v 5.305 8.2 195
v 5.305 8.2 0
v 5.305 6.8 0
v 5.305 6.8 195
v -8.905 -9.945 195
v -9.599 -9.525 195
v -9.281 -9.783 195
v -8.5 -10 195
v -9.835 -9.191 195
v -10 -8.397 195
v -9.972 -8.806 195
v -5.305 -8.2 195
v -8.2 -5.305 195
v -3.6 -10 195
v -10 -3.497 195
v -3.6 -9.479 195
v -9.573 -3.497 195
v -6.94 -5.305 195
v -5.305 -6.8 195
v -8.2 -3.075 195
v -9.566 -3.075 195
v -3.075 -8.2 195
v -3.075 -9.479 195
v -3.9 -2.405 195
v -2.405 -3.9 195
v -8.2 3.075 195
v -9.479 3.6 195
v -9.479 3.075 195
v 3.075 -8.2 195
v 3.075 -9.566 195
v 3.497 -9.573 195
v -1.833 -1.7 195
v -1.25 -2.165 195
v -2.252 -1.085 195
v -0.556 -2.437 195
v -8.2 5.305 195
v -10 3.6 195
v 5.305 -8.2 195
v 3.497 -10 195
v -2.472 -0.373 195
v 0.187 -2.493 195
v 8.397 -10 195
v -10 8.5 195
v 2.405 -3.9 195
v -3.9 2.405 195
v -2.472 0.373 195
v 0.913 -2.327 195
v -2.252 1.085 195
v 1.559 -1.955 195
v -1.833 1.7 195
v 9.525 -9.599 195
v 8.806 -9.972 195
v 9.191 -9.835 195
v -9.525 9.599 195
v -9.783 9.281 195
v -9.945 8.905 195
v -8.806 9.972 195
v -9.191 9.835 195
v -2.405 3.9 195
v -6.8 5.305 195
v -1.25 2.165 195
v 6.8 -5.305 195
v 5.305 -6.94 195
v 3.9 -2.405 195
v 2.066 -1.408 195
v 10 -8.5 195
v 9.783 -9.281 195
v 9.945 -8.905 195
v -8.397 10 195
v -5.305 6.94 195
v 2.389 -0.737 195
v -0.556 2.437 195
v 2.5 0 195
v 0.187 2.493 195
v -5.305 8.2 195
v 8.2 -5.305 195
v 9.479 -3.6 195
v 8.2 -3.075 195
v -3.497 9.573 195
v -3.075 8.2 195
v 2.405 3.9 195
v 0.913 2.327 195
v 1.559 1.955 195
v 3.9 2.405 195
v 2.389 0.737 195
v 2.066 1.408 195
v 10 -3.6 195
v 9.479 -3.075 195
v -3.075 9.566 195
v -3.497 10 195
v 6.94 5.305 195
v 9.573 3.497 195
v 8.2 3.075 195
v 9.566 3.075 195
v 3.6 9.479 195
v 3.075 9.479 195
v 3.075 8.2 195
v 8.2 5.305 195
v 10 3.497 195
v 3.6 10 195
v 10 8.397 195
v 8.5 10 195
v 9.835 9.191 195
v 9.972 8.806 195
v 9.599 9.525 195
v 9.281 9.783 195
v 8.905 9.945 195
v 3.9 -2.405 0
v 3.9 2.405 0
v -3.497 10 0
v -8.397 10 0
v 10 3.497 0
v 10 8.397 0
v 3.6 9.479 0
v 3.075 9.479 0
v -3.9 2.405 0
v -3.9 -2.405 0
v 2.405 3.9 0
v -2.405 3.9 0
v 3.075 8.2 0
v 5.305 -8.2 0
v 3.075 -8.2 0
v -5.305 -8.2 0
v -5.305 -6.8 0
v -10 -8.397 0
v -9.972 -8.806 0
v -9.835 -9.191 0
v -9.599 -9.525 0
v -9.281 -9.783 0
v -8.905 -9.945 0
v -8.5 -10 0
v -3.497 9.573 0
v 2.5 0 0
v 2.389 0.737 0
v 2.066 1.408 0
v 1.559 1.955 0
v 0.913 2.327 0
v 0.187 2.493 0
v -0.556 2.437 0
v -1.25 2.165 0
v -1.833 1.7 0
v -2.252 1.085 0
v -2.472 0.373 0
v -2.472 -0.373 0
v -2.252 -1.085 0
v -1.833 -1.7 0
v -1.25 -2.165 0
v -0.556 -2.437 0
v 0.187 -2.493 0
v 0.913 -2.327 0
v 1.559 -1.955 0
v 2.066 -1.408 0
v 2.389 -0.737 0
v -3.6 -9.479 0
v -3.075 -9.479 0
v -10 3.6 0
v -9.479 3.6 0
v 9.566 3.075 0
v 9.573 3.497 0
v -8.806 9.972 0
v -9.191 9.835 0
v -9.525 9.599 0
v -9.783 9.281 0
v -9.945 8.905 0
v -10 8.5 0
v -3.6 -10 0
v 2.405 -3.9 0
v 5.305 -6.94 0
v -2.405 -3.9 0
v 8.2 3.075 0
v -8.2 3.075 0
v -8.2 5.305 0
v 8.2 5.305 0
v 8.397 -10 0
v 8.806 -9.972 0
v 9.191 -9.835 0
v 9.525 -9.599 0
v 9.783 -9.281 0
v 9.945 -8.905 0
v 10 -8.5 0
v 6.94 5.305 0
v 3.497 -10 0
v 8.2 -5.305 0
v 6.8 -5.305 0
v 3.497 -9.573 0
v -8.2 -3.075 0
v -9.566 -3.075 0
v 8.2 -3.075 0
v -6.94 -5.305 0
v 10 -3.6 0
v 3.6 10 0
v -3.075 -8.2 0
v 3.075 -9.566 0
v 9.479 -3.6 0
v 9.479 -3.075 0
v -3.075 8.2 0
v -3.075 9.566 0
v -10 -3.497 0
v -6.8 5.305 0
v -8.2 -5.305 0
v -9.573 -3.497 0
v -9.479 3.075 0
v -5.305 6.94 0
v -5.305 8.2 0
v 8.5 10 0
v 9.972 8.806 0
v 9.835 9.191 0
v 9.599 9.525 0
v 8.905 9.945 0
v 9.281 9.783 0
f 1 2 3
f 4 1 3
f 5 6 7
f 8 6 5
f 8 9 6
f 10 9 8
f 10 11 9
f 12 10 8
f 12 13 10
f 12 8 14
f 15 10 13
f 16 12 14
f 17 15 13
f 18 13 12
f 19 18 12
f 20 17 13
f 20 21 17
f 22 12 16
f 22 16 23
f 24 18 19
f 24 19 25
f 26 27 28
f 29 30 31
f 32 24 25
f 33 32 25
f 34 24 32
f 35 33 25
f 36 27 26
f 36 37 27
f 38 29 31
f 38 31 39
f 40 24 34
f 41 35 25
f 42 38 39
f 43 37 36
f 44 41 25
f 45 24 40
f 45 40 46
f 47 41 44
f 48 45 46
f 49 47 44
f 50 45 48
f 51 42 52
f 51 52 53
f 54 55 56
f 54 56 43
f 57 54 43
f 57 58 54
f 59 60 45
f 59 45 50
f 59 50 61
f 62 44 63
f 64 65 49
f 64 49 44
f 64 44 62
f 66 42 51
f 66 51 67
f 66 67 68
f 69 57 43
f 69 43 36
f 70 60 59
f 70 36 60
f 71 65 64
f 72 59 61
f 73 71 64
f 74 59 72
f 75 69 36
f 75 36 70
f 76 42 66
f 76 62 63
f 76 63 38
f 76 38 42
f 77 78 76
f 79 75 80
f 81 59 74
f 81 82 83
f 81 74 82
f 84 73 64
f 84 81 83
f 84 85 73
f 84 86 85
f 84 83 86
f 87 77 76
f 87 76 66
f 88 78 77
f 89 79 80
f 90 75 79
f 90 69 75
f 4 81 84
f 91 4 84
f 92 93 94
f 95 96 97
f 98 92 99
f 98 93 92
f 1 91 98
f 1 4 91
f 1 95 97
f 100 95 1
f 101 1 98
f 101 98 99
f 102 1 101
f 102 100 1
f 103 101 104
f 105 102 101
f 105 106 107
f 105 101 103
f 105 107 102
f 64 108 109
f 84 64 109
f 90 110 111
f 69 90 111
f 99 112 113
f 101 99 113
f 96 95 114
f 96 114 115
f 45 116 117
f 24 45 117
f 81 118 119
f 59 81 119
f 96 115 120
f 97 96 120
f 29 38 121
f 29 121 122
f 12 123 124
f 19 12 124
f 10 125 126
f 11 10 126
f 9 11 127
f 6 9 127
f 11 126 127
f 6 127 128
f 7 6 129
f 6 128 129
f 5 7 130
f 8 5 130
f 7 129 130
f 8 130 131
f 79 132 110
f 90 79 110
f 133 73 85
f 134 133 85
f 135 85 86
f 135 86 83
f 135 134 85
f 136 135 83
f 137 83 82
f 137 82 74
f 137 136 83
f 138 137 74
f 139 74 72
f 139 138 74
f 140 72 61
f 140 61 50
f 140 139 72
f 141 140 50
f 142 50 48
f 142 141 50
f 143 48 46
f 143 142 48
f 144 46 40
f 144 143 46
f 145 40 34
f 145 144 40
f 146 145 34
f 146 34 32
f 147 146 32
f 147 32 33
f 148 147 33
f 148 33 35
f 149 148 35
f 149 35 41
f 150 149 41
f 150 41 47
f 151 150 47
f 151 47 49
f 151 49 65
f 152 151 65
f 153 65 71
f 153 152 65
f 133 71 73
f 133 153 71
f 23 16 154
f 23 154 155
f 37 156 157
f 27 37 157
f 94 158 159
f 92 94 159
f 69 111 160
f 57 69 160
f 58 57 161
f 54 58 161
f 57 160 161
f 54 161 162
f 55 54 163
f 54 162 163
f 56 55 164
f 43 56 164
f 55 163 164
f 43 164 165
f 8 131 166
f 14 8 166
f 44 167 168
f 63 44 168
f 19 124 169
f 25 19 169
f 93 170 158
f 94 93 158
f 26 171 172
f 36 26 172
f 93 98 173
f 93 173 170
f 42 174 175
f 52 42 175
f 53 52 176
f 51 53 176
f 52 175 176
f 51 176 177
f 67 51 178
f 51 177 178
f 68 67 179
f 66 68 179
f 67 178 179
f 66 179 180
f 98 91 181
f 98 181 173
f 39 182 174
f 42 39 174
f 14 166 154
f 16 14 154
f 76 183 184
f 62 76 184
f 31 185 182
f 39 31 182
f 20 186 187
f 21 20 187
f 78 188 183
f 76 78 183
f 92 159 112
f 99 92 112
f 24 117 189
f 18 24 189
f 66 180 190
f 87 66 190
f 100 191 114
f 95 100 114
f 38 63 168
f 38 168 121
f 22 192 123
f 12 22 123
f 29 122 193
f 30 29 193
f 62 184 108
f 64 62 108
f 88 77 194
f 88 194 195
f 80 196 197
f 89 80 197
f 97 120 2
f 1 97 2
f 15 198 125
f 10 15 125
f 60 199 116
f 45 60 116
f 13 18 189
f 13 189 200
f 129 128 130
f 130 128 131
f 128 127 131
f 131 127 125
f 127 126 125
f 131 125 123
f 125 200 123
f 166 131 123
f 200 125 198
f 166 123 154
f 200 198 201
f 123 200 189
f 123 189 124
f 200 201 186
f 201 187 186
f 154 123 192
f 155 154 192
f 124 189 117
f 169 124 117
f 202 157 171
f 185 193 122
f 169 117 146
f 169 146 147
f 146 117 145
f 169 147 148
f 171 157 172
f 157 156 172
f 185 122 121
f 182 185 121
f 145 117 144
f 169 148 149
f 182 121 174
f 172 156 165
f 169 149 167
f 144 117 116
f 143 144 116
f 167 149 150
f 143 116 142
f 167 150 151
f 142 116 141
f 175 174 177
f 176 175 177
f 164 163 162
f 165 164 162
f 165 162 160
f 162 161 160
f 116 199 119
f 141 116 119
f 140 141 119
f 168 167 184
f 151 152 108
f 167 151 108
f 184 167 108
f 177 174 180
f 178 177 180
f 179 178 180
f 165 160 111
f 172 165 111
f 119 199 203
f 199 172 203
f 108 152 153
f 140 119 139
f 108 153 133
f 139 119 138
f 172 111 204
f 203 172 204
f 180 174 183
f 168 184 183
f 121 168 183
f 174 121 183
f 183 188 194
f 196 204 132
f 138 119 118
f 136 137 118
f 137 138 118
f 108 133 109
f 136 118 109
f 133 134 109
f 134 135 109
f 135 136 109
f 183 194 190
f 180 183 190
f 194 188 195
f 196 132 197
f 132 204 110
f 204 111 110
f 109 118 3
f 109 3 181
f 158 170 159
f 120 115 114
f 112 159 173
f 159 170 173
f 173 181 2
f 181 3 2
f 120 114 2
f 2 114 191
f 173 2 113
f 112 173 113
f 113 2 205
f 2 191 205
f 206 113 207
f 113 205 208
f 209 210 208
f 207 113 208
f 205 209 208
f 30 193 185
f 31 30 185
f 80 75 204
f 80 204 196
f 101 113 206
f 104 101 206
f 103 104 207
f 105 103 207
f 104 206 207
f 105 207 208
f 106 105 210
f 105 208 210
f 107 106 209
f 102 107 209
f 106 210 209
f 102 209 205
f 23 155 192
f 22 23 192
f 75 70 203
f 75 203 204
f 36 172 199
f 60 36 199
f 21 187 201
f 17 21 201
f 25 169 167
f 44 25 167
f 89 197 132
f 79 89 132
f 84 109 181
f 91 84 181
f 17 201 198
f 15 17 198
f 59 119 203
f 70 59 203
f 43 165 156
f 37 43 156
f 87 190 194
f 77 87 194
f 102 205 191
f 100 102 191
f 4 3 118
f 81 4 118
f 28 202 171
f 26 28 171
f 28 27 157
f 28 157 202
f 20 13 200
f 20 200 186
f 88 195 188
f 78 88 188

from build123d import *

# Parameters (mm, degrees)
SKETCH1_R           = 2.5
BOSS_EXTRUDE1_DEPTH = 195


with BuildPart() as part:
    # Sketch1 → Boss-Extrude1 (new body)
    with BuildSketch(Plane.XY):
        with BuildLine():
            Line((9.573137603, 3.497470387), (10, 3.497470387))
            Line((10, 3.497470387), (10, 8.397470387))
            ThreePointArc((10, 8.397470387), (9.598622578, 9.525052949), (8.5, 10))
            Line((8.5, 10), (3.6, 10))
            Line((3.6, 10), (3.6, 9.479132912))
            Line((3.6, 9.479132912), (3.075, 9.479132912))
            Line((3.075, 9.479132912), (3.075, 8.2))
            Line((3.075, 8.2), (5.304654122, 8.2))
            Line((5.304654122, 8.2), (5.304654122, 6.8))
            Line((5.304654122, 6.8), (2.404654122, 3.9))
            Line((2.404654122, 3.9), (-2.404654122, 3.9))
            Line((-2.404654122, 3.9), (-5.304654122, 6.94037733))
            Line((-5.304654122, 6.94037733), (-5.304654122, 8.2))
            Line((-5.304654122, 8.2), (-3.075, 8.2))
            Line((-3.075, 8.2), (-3.075, 9.565763355))
            Line((-3.075, 9.565763355), (-3.497470387, 9.573137603))
            Line((-3.497470387, 9.573137603), (-3.497470387, 10))
            Line((-3.497470387, 10), (-8.397470387, 10))
            ThreePointArc((-8.397470387, 10), (-9.525052949, 9.598622578), (-10, 8.5))
            Line((-10, 8.5), (-10, 3.6))
            Line((-10, 3.6), (-9.479132912, 3.6))
            Line((-9.479132912, 3.6), (-9.479132912, 3.075))
            Line((-9.479132912, 3.075), (-8.2, 3.075))
            Line((-8.2, 3.075), (-8.2, 5.304654122))
            Line((-8.2, 5.304654122), (-6.8, 5.304654122))
            Line((-6.8, 5.304654122), (-3.9, 2.404654122))
            Line((-3.9, 2.404654122), (-3.9, -2.404654122))
            Line((-3.9, -2.404654122), (-6.94037733, -5.304654122))
            Line((-6.94037733, -5.304654122), (-8.2, -5.304654122))
            Line((-8.2, -5.304654122), (-8.2, -3.075))
            Line((-8.2, -3.075), (-9.565763355, -3.075))
            Line((-9.565763355, -3.075), (-9.573137603, -3.497470387))
            Line((-9.573137603, -3.497470387), (-10, -3.497470387))
            Line((-10, -3.497470387), (-10, -8.397470387))
            ThreePointArc((-10, -8.397470387), (-9.598622578, -9.525052949), (-8.5, -10))
            Line((-8.5, -10), (-3.6, -10))
            Line((-3.6, -10), (-3.6, -9.479132912))
            Line((-3.6, -9.479132912), (-3.075, -9.479132912))
            Line((-3.075, -9.479132912), (-3.075, -8.2))
            Line((-3.075, -8.2), (-5.304654122, -8.2))
            Line((-5.304654122, -8.2), (-5.304654122, -6.8))
            Line((-5.304654122, -6.8), (-2.404654122, -3.9))
            Line((-2.404654122, -3.9), (2.404654122, -3.9))
            Line((2.404654122, -3.9), (5.304654122, -6.94037733))
            Line((5.304654122, -6.94037733), (5.304654122, -8.2))
            Line((5.304654122, -8.2), (3.075, -8.2))
            Line((3.075, -8.2), (3.075, -9.565763355))
            Line((3.075, -9.565763355), (3.497470387, -9.573137603))
            Line((3.497470387, -9.573137603), (3.497470387, -10))
            Line((3.497470387, -10), (8.397470387, -10))
            ThreePointArc((8.397470387, -10), (9.525052949, -9.598622578), (10, -8.5))
            Line((10, -8.5), (10, -3.6))
            Line((10, -3.6), (9.479132912, -3.6))
            Line((9.479132912, -3.6), (9.479132912, -3.075))
            Line((9.479132912, -3.075), (8.2, -3.075))
            Line((8.2, -3.075), (8.2, -5.304654122))
            Line((8.2, -5.304654122), (6.8, -5.304654122))
            Line((6.8, -5.304654122), (3.9, -2.404654122))
            Line((3.9, -2.404654122), (3.9, 2.404654122))
            Line((3.9, 2.404654122), (6.94037733, 5.304654122))
            Line((6.94037733, 5.304654122), (8.2, 5.304654122))
            Line((8.2, 5.304654122), (8.2, 3.075))
            Line((8.2, 3.075), (9.565763355, 3.075))
            Line((9.565763355, 3.075), (9.573137603, 3.497470387))
        make_face()
        Circle(SKETCH1_R, mode=Mode.SUBTRACT)
    extrude(amount=BOSS_EXTRUDE1_DEPTH)


solid = part.part
